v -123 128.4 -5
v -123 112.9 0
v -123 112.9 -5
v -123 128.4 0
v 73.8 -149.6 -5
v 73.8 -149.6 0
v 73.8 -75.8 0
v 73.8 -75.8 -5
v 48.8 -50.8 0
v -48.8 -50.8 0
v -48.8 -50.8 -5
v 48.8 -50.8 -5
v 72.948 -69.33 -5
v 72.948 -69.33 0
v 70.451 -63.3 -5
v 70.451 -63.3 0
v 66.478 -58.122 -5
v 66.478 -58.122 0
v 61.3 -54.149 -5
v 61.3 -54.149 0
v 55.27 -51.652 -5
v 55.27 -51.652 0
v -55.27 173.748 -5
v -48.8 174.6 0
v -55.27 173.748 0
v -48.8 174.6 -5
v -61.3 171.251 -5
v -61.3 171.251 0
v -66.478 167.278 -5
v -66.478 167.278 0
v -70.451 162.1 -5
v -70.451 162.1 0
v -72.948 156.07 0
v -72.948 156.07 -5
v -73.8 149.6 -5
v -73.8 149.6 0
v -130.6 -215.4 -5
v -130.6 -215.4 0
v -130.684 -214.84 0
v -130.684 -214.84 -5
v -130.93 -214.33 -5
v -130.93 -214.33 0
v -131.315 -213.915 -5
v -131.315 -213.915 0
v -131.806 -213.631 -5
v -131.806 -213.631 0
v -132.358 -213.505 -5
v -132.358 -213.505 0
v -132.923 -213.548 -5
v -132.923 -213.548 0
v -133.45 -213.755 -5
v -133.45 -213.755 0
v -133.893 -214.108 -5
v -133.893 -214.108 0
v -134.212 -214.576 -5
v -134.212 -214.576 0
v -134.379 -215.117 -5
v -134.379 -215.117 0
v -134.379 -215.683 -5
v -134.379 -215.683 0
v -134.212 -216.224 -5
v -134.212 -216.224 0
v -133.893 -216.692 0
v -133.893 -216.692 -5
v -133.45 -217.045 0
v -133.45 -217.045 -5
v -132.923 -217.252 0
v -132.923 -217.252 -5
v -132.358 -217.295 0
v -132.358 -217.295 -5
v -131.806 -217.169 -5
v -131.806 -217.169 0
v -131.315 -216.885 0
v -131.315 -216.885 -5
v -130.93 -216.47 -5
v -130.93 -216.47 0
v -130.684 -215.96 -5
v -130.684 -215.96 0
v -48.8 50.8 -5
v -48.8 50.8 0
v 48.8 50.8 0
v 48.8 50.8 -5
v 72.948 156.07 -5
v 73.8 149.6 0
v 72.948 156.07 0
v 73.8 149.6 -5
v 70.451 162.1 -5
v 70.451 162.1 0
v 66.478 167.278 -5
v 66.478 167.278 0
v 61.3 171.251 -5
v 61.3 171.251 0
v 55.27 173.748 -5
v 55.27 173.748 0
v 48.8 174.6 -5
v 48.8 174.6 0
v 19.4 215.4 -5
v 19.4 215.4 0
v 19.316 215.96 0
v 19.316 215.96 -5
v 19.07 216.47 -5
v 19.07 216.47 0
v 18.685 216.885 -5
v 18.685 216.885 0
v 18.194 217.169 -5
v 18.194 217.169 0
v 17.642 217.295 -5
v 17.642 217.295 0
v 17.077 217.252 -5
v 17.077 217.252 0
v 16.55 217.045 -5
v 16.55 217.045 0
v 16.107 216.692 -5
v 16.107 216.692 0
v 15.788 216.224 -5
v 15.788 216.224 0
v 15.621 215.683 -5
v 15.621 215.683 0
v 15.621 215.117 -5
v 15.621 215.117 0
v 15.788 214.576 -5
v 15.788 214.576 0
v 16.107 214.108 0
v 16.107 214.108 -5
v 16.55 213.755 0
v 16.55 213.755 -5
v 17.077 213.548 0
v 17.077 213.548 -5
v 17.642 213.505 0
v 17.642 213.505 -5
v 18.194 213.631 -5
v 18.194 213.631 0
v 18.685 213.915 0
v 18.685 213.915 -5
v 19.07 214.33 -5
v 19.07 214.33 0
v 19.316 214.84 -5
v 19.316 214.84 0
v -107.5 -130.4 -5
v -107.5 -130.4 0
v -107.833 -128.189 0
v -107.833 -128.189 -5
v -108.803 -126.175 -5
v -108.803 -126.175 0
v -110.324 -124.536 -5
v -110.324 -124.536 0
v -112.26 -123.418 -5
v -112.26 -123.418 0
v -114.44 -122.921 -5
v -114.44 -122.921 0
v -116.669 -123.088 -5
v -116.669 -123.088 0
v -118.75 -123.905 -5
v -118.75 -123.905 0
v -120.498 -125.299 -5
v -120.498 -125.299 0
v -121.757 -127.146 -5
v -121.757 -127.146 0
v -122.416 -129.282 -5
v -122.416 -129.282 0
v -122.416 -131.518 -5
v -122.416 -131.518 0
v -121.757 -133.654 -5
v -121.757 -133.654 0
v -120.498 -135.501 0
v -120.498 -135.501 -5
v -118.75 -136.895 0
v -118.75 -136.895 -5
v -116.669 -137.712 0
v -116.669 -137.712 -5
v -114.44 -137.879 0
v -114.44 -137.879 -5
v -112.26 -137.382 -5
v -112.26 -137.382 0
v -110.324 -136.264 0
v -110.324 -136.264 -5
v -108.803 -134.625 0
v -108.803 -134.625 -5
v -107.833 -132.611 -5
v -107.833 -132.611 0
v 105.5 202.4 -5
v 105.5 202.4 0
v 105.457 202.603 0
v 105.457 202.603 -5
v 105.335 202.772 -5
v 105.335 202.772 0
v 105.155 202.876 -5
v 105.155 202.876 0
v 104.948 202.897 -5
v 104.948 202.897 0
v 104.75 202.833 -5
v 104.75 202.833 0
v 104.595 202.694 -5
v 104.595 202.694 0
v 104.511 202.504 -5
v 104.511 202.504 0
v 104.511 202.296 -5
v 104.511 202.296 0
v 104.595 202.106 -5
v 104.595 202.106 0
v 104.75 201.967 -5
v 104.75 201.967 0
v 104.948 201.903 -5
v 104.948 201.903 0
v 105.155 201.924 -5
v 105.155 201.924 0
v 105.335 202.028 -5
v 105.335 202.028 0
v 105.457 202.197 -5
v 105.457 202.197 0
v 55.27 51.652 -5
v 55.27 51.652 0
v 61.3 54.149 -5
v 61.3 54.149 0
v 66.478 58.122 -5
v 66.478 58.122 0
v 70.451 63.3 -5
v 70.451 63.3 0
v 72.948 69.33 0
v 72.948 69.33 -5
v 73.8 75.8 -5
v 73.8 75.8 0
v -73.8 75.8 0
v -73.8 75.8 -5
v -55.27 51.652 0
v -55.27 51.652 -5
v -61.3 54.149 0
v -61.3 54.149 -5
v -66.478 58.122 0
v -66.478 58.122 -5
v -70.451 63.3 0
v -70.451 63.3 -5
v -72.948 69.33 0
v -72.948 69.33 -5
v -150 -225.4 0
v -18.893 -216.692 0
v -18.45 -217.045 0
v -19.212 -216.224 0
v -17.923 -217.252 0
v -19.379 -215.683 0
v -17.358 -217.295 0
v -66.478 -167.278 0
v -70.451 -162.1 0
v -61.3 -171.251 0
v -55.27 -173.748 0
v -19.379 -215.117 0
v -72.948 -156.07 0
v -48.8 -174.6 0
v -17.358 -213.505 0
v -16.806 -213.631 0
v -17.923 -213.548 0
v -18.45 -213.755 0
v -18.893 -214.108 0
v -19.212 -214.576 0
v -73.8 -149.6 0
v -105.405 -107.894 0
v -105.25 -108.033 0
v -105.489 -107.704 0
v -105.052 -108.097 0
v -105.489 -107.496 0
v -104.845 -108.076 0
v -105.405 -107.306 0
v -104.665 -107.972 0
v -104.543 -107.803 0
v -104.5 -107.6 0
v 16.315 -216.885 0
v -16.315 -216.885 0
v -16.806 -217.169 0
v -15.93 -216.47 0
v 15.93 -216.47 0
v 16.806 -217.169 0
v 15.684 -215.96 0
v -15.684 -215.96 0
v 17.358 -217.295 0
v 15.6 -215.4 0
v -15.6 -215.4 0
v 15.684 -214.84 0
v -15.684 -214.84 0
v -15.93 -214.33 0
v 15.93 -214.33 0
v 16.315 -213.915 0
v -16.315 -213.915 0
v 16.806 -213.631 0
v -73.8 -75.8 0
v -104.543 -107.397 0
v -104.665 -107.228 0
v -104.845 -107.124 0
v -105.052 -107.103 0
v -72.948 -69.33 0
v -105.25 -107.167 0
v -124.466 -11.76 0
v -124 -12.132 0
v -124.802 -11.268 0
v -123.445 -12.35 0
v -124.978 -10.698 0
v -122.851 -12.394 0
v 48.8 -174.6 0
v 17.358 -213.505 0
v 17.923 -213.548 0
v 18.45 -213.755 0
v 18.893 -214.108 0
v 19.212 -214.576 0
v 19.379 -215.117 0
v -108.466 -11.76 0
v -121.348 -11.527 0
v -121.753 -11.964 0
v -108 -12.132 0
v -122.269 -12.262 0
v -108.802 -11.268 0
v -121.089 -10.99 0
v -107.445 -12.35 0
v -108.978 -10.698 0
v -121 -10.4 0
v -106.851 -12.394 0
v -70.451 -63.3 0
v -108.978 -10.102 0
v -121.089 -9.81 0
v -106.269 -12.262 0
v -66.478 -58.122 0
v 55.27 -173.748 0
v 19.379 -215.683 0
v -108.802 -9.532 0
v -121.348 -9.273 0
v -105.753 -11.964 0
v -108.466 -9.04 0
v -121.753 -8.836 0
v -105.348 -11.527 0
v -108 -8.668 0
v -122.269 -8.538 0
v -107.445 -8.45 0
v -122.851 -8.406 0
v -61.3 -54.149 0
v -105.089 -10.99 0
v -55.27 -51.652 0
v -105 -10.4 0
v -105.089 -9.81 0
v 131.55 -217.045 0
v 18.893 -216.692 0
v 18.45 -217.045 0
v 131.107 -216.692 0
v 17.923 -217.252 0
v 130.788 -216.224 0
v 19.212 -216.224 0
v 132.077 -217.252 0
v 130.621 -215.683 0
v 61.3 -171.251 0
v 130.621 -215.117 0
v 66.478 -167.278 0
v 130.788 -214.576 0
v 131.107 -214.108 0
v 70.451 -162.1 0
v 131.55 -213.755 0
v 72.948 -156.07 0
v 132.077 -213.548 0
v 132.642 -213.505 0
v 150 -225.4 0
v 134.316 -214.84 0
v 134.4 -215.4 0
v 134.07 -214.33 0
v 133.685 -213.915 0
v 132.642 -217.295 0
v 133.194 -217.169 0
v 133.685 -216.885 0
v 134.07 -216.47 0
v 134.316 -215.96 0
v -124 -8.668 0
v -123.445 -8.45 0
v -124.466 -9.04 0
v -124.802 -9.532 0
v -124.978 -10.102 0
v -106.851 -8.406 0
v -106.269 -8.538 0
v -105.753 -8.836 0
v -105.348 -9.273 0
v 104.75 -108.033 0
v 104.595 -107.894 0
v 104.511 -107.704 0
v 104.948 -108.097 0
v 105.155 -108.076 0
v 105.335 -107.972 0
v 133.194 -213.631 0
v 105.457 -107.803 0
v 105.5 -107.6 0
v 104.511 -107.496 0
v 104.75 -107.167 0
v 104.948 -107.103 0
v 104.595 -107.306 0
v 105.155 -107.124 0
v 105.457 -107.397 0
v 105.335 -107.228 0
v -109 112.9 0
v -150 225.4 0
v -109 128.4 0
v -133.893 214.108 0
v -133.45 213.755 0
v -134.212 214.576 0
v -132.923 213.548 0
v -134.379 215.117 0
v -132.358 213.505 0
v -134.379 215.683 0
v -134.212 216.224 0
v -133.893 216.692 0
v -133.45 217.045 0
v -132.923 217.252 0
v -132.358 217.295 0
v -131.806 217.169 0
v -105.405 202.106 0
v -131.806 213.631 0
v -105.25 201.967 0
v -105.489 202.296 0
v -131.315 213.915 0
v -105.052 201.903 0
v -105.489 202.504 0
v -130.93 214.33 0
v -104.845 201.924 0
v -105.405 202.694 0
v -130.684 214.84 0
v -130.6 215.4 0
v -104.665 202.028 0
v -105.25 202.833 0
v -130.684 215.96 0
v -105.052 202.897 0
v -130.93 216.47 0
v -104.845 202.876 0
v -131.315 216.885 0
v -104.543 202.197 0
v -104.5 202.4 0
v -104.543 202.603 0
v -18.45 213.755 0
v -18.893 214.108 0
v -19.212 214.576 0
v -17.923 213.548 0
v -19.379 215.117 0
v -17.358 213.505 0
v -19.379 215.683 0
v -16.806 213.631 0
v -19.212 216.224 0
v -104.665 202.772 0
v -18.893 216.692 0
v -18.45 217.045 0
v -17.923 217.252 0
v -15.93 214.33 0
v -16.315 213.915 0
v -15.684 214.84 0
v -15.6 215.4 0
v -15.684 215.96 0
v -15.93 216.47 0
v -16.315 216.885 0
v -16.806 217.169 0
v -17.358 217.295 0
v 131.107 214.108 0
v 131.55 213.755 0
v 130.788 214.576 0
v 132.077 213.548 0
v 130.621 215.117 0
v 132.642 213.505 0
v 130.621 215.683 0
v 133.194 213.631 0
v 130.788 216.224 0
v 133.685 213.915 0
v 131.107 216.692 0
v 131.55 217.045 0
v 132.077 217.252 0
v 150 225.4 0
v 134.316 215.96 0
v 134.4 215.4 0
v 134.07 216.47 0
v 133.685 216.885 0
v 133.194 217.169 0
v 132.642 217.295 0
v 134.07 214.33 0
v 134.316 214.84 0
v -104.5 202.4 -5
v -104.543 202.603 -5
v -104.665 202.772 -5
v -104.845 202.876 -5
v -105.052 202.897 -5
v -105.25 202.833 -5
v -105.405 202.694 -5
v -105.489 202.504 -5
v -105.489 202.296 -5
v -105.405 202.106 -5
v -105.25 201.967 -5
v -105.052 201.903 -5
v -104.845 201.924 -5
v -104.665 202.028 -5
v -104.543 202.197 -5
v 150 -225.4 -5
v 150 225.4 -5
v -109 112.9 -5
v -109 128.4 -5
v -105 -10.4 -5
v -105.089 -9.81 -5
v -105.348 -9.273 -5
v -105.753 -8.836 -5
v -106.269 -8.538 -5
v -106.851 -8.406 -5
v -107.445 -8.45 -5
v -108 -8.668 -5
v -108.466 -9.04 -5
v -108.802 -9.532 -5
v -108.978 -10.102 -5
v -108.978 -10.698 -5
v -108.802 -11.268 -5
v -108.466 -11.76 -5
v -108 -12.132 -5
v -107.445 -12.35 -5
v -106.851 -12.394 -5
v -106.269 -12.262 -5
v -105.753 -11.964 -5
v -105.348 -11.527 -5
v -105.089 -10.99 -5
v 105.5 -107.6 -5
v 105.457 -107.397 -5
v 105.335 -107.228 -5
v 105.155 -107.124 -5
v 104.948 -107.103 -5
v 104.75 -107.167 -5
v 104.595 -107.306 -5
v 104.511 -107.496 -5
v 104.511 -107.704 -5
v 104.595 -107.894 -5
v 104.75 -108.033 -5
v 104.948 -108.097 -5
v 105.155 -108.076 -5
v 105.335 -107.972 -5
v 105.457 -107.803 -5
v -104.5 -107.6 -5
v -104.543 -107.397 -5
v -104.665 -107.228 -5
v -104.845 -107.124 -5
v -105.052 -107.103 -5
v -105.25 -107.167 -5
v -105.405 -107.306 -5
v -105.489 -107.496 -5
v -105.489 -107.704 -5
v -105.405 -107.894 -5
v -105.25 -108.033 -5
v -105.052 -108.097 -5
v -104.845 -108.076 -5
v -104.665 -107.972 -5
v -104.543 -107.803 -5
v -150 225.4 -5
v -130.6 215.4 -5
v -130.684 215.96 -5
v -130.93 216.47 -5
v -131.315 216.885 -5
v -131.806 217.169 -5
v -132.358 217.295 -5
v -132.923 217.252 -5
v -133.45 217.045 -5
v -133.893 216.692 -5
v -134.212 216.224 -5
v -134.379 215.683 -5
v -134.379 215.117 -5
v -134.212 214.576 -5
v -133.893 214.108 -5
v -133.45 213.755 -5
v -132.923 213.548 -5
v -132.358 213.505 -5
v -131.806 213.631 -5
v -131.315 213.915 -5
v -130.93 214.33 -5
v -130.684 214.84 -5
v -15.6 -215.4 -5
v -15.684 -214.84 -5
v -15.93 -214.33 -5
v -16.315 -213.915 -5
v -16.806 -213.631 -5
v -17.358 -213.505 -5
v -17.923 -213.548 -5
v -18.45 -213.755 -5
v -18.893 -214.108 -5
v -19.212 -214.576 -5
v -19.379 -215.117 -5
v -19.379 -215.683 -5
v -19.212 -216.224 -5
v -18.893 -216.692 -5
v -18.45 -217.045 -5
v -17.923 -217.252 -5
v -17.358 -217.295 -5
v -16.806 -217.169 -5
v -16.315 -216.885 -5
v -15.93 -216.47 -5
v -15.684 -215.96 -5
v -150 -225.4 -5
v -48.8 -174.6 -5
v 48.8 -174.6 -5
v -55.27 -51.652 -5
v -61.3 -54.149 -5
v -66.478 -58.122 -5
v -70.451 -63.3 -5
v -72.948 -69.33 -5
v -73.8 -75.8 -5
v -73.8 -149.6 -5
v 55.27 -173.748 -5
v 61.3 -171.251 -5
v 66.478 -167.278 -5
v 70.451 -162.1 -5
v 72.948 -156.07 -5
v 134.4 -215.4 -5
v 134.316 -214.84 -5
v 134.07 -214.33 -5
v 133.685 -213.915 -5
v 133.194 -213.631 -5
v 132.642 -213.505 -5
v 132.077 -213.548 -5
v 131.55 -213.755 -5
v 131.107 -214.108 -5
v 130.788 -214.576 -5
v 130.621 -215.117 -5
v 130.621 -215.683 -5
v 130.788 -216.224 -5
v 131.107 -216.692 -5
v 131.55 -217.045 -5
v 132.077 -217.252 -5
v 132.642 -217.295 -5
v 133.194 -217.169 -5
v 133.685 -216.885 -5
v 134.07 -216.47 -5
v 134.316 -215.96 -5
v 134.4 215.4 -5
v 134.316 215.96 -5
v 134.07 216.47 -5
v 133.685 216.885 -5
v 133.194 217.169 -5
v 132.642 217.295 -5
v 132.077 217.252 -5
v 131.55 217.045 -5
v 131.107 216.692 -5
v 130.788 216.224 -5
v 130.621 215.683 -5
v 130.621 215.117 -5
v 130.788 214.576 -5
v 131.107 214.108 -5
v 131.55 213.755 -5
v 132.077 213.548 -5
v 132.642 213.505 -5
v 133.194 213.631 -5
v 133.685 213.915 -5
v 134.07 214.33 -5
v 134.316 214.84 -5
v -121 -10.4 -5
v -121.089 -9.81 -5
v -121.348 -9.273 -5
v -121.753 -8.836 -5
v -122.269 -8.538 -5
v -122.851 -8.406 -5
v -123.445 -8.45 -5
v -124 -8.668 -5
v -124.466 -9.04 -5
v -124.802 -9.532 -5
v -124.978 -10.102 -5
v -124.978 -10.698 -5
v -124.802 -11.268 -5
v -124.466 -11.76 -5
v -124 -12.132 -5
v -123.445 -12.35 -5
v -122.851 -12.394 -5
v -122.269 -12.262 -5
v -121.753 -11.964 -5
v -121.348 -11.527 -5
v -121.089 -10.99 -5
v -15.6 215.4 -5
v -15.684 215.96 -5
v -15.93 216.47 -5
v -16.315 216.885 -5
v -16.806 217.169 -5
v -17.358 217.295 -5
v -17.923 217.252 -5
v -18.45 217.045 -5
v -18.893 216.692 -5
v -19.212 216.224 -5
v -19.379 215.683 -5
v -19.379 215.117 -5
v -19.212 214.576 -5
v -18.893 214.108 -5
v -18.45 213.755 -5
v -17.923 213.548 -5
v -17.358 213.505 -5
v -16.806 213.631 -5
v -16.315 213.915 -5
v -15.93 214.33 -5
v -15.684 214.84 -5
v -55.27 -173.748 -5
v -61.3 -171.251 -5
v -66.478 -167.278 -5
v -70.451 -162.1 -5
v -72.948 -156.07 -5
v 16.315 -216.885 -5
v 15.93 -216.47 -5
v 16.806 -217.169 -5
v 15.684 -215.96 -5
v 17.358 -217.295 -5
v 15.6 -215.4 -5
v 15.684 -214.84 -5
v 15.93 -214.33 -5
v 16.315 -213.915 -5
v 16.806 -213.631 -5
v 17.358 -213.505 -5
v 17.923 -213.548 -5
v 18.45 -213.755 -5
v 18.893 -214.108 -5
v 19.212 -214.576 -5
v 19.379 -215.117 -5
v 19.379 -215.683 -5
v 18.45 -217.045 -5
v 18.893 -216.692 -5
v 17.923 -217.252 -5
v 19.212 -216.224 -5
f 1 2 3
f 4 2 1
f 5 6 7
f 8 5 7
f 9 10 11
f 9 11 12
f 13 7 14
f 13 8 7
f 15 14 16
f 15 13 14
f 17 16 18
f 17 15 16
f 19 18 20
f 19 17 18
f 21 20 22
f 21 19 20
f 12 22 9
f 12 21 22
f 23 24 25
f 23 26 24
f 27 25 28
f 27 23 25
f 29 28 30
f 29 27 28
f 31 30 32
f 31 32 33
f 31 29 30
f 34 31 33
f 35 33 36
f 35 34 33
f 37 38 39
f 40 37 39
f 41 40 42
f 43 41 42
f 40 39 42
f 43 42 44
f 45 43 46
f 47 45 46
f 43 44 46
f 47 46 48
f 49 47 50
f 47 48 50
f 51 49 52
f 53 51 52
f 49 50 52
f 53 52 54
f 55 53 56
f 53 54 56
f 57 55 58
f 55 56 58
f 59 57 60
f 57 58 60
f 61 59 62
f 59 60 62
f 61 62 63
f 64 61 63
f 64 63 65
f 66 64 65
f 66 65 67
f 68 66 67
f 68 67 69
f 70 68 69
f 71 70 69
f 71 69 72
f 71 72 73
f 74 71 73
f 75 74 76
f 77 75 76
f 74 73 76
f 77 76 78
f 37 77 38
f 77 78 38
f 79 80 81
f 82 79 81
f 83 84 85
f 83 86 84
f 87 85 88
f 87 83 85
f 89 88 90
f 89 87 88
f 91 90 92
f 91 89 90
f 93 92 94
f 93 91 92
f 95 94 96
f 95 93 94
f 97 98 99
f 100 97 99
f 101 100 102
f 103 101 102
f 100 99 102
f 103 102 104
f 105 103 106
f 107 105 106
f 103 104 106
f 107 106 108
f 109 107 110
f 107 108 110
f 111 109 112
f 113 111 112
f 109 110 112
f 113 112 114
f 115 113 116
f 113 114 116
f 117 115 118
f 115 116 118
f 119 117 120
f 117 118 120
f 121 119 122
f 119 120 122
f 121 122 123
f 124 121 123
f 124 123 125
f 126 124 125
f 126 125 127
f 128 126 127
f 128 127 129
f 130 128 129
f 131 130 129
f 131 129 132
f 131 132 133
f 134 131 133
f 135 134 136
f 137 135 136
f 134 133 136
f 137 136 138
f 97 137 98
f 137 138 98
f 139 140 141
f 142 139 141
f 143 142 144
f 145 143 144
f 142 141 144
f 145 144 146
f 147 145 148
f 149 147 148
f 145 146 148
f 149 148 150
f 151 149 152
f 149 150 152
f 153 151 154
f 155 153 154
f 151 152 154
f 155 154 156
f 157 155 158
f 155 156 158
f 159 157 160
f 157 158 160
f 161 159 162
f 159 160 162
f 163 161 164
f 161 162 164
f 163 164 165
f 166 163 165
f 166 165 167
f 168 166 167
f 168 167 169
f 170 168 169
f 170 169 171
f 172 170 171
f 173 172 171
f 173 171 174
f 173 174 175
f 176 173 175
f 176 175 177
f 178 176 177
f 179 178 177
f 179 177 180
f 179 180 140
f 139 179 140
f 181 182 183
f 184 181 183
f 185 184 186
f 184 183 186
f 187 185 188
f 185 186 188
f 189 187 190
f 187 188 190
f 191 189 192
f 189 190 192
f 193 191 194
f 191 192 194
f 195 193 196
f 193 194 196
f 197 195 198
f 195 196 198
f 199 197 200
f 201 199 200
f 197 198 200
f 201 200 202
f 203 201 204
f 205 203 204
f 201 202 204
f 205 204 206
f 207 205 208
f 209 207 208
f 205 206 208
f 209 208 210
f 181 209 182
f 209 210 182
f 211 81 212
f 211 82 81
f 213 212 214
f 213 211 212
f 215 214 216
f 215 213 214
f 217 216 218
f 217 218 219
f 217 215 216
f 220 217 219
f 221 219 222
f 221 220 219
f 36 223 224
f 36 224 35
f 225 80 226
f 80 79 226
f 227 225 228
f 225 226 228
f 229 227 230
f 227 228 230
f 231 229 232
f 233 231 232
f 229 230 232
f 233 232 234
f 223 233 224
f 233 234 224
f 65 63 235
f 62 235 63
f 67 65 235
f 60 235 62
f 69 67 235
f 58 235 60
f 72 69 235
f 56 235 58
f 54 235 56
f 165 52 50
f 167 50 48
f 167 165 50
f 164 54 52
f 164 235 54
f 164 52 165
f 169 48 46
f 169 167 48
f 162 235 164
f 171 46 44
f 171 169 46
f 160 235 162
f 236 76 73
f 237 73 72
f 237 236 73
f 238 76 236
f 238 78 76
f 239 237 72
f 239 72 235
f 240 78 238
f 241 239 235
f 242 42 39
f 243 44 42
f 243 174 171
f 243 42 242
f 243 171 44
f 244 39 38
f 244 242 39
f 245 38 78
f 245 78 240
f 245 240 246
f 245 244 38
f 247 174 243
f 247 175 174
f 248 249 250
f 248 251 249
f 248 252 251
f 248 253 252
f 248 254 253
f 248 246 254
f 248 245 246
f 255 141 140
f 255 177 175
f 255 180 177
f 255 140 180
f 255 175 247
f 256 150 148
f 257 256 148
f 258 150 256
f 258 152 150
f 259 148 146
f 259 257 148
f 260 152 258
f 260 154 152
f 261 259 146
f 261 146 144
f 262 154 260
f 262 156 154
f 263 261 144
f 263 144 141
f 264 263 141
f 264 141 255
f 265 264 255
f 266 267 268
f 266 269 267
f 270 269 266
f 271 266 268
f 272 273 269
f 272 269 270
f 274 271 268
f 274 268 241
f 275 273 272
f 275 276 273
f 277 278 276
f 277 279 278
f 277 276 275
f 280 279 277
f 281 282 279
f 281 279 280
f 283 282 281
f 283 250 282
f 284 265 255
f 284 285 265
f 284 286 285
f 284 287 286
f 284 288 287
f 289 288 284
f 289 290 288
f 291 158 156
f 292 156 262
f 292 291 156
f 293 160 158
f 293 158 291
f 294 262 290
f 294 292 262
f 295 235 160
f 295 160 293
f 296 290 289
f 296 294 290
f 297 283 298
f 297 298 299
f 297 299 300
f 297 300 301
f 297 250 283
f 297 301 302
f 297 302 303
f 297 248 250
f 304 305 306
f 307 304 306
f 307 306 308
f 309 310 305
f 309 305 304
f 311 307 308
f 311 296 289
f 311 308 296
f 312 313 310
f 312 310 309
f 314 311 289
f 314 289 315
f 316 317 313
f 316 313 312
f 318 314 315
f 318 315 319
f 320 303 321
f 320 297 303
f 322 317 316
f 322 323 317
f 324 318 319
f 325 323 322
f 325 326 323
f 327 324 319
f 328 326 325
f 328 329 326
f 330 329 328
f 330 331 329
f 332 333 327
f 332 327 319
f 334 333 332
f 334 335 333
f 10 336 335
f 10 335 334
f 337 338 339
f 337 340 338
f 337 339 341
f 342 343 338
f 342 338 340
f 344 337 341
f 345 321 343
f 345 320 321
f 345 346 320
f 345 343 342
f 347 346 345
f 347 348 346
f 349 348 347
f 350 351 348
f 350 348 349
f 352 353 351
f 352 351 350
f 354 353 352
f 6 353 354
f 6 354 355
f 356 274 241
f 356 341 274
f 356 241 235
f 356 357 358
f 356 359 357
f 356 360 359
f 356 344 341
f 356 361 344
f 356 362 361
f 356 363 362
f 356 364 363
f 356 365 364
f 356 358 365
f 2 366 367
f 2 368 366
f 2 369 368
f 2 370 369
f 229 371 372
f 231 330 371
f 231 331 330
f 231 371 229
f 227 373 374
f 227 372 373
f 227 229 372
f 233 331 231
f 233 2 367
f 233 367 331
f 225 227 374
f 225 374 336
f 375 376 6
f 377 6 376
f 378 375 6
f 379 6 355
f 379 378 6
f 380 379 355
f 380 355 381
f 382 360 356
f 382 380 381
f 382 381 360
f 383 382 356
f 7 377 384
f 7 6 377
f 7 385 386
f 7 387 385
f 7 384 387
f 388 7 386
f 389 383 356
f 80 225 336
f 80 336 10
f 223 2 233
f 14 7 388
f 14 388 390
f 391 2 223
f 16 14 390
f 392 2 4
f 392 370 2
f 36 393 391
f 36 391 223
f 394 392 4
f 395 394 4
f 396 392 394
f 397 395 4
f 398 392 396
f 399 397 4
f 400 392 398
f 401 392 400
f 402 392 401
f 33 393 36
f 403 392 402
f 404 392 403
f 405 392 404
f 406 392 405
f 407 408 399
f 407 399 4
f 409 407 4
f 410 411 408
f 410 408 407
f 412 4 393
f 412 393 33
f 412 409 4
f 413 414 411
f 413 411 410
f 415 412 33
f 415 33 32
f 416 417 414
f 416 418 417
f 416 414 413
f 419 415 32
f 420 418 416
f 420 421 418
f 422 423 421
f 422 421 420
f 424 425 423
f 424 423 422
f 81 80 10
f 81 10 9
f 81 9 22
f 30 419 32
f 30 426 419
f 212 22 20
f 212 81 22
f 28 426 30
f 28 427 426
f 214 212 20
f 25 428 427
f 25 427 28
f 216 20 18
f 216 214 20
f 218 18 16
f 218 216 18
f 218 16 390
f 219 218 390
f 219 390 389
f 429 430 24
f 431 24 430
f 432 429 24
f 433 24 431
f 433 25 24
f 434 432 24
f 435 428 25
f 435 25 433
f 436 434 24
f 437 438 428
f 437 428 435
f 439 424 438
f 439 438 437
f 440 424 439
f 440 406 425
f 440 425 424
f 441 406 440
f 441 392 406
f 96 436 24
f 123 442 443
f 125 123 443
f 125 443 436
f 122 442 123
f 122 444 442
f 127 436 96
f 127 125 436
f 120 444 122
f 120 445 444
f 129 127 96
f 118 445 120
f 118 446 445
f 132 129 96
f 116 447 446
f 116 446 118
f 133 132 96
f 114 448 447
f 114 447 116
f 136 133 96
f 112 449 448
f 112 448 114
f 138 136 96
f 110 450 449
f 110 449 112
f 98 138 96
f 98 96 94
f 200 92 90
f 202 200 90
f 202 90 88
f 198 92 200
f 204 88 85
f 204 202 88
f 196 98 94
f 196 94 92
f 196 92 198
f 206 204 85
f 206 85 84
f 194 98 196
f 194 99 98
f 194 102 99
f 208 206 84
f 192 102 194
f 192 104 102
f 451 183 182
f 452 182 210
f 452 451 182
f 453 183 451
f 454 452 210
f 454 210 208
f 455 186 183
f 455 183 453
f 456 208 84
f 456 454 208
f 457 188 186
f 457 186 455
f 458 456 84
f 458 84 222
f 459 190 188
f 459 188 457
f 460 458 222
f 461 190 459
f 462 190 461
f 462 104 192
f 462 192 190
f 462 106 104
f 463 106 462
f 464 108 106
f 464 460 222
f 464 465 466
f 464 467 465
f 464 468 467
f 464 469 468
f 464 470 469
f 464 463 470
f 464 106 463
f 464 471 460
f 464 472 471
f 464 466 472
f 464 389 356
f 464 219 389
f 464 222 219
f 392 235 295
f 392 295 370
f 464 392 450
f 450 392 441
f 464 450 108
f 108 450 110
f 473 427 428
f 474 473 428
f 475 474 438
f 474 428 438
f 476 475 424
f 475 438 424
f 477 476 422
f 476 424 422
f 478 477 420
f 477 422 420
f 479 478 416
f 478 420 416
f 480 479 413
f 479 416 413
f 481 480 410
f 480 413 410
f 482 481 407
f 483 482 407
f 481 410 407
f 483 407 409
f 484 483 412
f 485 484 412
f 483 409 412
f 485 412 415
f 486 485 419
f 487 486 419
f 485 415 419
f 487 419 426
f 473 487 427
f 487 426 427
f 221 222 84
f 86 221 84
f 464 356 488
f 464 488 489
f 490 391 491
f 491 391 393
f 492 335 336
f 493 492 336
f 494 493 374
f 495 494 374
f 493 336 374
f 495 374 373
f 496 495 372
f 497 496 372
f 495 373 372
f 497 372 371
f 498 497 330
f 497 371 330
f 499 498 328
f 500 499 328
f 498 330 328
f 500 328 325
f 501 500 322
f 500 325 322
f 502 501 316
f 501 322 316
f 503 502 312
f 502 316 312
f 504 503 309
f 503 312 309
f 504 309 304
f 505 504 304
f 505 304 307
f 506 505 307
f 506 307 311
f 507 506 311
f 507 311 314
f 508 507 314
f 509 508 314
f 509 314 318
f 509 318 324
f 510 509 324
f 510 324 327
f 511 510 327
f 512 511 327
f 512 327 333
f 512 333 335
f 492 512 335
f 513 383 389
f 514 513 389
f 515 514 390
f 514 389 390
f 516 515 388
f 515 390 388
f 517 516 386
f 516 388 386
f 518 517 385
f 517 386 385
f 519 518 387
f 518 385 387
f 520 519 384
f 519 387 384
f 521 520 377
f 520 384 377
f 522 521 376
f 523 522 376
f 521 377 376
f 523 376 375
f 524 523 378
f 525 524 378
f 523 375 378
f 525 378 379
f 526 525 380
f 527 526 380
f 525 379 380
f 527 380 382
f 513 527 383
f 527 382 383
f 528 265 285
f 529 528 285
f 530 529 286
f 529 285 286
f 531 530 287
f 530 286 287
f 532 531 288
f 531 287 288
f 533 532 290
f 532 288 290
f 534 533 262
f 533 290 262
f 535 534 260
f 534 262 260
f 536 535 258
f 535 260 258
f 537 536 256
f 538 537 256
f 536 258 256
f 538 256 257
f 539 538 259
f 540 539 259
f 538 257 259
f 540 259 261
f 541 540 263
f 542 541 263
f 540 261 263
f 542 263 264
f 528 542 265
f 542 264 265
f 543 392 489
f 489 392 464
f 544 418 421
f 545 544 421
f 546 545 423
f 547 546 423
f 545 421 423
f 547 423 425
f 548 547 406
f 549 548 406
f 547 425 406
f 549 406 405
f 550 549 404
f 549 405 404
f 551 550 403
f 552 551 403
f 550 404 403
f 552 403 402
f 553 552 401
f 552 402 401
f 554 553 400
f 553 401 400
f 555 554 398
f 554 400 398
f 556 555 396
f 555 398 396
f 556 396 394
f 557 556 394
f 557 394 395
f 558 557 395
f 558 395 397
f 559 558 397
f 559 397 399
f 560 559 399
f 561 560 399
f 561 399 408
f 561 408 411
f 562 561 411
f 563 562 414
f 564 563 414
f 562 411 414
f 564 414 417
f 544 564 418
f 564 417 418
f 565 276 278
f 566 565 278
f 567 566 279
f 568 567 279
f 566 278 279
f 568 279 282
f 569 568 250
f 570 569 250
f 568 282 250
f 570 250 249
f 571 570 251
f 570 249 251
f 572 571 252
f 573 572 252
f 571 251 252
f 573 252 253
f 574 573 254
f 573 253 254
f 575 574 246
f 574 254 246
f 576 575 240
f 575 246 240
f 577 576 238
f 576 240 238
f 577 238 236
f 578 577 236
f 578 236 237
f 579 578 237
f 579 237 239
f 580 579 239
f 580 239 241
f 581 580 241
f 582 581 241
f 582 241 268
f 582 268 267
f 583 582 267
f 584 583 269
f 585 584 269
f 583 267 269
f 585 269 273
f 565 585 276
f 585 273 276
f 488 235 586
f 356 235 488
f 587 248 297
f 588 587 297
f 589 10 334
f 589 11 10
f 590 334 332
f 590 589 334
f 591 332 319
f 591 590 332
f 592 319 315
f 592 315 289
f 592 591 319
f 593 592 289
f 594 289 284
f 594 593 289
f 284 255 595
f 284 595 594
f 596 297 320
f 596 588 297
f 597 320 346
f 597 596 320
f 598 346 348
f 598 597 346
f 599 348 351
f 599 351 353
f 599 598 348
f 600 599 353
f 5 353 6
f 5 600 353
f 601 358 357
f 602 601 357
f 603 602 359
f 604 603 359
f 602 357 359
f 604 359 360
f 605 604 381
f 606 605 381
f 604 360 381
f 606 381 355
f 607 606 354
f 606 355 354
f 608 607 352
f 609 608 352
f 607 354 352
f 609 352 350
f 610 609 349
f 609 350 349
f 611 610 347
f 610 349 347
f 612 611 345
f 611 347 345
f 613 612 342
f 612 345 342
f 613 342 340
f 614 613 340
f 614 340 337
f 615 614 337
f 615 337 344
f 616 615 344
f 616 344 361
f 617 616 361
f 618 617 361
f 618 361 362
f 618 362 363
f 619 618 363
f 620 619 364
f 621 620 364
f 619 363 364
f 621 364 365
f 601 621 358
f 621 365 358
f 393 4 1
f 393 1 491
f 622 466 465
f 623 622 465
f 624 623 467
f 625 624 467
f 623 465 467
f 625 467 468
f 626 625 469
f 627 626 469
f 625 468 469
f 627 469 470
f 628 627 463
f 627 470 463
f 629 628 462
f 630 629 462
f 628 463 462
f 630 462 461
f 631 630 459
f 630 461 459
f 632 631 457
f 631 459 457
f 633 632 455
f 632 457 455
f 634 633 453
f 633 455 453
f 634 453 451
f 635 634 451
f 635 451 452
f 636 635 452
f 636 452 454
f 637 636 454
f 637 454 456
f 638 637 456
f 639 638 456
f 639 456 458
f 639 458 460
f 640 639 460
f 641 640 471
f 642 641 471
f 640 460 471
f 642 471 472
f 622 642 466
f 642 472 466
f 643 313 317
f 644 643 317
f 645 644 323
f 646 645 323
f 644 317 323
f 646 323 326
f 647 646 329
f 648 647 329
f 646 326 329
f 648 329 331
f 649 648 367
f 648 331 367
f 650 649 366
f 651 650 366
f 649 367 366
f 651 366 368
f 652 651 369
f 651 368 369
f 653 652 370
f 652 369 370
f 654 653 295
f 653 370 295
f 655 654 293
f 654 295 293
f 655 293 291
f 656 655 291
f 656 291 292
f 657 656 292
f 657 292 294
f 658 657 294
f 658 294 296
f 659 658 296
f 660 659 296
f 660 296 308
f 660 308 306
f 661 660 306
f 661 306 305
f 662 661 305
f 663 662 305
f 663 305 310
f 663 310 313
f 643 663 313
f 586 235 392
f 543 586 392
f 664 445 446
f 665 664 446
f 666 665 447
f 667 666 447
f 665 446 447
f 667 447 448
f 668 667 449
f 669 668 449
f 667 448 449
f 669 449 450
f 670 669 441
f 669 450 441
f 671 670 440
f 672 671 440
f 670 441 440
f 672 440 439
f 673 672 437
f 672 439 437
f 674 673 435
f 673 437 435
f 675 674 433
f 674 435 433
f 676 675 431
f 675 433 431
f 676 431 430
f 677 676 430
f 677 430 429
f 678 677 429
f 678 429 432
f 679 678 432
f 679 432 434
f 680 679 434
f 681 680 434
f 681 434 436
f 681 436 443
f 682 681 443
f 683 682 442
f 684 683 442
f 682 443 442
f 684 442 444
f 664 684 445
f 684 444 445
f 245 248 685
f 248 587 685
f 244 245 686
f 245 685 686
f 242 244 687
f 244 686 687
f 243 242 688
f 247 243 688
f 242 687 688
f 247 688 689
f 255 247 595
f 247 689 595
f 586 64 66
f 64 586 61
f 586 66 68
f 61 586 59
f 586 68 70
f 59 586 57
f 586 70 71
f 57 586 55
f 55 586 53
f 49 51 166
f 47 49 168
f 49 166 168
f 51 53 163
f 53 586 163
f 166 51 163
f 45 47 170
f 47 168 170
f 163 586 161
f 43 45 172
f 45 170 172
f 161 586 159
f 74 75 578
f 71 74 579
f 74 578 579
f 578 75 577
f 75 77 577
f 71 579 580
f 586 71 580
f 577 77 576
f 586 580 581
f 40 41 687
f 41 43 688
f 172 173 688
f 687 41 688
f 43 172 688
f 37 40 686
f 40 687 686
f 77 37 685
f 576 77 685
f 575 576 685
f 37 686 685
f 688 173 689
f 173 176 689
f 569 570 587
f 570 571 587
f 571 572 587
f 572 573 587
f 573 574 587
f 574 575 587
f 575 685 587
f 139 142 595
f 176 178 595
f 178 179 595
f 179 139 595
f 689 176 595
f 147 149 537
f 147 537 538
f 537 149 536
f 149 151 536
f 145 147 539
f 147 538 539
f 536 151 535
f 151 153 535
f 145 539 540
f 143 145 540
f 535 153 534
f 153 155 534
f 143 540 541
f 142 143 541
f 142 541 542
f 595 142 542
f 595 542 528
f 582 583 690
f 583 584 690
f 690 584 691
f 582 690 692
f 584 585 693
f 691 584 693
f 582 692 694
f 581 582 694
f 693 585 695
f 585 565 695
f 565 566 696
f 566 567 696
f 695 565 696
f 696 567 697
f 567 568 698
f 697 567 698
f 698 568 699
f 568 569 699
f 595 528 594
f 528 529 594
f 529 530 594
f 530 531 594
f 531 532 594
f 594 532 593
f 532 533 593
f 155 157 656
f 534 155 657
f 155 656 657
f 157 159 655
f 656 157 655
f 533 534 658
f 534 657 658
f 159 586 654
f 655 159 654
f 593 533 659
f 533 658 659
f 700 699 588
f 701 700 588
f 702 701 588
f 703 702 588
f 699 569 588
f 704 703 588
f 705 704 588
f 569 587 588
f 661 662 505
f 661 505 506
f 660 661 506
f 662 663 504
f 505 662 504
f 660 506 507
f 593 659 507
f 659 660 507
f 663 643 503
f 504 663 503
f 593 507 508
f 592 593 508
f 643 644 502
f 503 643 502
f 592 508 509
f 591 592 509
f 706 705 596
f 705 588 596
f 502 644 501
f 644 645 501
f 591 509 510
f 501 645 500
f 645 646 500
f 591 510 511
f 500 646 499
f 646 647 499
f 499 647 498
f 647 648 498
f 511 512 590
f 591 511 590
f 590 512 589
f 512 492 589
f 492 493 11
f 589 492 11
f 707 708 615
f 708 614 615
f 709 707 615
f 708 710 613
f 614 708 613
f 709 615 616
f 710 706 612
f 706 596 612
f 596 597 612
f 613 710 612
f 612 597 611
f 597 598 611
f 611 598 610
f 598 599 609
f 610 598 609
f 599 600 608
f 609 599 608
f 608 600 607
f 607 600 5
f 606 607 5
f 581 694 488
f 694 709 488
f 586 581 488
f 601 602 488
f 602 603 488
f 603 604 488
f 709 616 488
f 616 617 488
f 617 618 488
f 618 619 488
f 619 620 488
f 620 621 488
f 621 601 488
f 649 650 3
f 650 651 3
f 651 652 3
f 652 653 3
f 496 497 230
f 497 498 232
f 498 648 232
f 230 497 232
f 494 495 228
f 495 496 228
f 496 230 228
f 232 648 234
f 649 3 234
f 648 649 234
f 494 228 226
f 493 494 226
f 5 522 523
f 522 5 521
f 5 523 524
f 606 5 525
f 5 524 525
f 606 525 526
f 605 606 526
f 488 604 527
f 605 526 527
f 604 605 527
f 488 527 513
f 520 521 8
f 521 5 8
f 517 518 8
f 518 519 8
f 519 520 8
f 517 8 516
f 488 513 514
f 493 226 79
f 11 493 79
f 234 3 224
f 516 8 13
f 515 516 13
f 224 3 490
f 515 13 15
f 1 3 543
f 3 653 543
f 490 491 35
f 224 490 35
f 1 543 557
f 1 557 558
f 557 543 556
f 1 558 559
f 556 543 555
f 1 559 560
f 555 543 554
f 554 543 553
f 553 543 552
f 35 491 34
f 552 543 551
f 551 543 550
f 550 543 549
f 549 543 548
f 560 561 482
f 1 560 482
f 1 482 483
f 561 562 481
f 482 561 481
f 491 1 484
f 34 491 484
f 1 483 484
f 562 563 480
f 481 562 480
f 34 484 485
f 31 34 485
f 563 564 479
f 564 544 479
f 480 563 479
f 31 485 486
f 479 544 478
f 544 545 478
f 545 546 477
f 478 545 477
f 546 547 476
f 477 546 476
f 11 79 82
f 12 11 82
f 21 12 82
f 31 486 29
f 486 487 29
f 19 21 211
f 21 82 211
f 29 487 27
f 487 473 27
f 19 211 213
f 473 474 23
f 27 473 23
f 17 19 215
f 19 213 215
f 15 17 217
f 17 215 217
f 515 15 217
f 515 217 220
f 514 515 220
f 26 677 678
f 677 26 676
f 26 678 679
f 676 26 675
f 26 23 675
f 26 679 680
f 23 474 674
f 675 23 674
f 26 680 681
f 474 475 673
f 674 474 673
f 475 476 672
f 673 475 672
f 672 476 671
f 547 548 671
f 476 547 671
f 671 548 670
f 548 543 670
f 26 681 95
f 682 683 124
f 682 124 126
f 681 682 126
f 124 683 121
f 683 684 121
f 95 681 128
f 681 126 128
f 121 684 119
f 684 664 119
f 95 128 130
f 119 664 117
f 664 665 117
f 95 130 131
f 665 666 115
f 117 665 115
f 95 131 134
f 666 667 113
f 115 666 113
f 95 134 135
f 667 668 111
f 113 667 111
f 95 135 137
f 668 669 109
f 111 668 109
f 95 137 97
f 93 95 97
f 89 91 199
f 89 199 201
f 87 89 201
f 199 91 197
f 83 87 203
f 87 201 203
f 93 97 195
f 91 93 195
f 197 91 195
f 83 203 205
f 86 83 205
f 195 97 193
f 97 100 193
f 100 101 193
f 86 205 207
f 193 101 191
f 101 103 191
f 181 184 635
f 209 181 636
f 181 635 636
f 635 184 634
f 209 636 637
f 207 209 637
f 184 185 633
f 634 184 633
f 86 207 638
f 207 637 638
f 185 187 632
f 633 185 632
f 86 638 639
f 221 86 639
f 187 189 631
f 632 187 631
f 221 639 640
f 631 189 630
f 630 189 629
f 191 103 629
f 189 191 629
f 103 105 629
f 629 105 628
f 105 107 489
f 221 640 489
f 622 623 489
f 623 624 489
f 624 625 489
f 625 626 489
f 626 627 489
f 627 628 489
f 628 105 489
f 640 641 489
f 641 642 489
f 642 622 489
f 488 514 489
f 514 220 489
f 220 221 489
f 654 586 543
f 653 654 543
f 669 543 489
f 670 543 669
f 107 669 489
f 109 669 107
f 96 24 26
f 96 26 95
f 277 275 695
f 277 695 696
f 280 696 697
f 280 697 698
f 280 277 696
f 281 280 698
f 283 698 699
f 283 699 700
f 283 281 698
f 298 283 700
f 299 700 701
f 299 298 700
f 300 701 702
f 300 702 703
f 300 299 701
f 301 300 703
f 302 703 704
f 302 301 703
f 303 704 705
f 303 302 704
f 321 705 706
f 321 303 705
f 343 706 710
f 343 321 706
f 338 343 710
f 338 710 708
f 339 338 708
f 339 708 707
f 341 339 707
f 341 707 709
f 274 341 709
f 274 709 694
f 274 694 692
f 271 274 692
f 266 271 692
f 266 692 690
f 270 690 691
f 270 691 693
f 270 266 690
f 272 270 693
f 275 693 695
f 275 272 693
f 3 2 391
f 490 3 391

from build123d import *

# Parameters (mm, degrees)
F0_W      = 300
F0_H      = 450.8
F0_R      = 1.9
F2_DEPTH  = 5
F1_R      = 0.5
F3_DEPTH  = 25
F4_W      = 147.6
F4_H      = 123.8
F5_DEPTH  = 25
F6_R      = 25
F7_W      = 14
F7_H      = 15.5
F8_DEPTH  = 25
F9_R      = 7.5
F10_DEPTH = 25
F9_R_2    = 2
F11_DEPTH = 25


with BuildPart() as f2:
    # F0 (on Top) → F2 (new body)
    with BuildSketch(Plane.XY):
        Rectangle(F0_W, F0_H)
        with Locations((-132.5, -215.4)):
            Circle(F0_R, mode=Mode.SUBTRACT)
        with Locations((-17.5, -215.4)):
            Circle(F0_R, mode=Mode.SUBTRACT)
        with BuildLine():
            ThreePointArc((19.4, -215.4), (17.5, -217.3), (15.6, -215.4))
            ThreePointArc((15.6, -215.4), (17.5, -213.5), (19.4, -215.4))
        make_face(mode=Mode.SUBTRACT)
        with Locations((132.5, -215.4)):
            Circle(F0_R, mode=Mode.SUBTRACT)
        with Locations((-132.5, 215.4)):
            Circle(F0_R, mode=Mode.SUBTRACT)
        with Locations((-17.5, 215.4)):
            Circle(F0_R, mode=Mode.SUBTRACT)
        with Locations((17.5, 215.4)):
            Circle(F0_R, mode=Mode.SUBTRACT)
        with Locations((132.5, 215.4)):
            Circle(F0_R, mode=Mode.SUBTRACT)
    extrude(amount=-F2_DEPTH)

    # F1 (on Top) → F3 (cut)
    with BuildSketch(Plane.XY):
        with Locations((-105, 202.4)):
            Circle(F1_R)
        with Locations((105, 202.4)):
            Circle(F1_R)
        with Locations((105, -107.6)):
            Circle(F1_R)
        with Locations((-105, -107.6)):
            Circle(F1_R)
    extrude(amount=-F3_DEPTH, mode=Mode.SUBTRACT)

    # F4 (on face) → F5 (cut)
    with BuildSketch(Plane.XY):
        with Locations((0, 112.7)):
            Rectangle(F4_W, F4_H)
        with Locations((0, -112.7)):
            Rectangle(F4_W, F4_H)
    extrude(amount=-F5_DEPTH, mode=Mode.SUBTRACT)

    # F6
    f6_edges = [f2.edges().sort_by_distance(p)[0] for p in [
        (-73.8, 174.6, -2.5),
        (73.8, 174.6, -2.5),
        (-73.8, 50.8, -2.5),
        (73.8, 50.8, -2.5),
        (-73.8, -50.8, -2.5),
        (73.8, -50.8, -2.5),
        (73.8, -174.6, -2.5),
        (-73.8, -174.6, -2.5),
    ]]
    fillet(f6_edges, radius=F6_R)

    # F7 (on face) → F8 (cut)
    with BuildSketch(Plane.XY):
        with Locations((-116, 120.65)):
            Rectangle(F7_W, F7_H)
    extrude(amount=-F8_DEPTH, mode=Mode.SUBTRACT)

    # F9 (on face) → F10 (cut)
    with BuildSketch(Plane.XY):
        with Locations((-115, -130.4)):
            Circle(F9_R)
    extrude(amount=-F10_DEPTH, mode=Mode.SUBTRACT)

    # F9 (on face) → F11 (cut)
    with BuildSketch(Plane.XY):
        with Locations((-107, -10.4)):
            Circle(F9_R_2)
        with Locations((-123, -10.4)):
            Circle(F9_R_2)
    extrude(amount=-F11_DEPTH, mode=Mode.SUBTRACT)


solid = f2.part
